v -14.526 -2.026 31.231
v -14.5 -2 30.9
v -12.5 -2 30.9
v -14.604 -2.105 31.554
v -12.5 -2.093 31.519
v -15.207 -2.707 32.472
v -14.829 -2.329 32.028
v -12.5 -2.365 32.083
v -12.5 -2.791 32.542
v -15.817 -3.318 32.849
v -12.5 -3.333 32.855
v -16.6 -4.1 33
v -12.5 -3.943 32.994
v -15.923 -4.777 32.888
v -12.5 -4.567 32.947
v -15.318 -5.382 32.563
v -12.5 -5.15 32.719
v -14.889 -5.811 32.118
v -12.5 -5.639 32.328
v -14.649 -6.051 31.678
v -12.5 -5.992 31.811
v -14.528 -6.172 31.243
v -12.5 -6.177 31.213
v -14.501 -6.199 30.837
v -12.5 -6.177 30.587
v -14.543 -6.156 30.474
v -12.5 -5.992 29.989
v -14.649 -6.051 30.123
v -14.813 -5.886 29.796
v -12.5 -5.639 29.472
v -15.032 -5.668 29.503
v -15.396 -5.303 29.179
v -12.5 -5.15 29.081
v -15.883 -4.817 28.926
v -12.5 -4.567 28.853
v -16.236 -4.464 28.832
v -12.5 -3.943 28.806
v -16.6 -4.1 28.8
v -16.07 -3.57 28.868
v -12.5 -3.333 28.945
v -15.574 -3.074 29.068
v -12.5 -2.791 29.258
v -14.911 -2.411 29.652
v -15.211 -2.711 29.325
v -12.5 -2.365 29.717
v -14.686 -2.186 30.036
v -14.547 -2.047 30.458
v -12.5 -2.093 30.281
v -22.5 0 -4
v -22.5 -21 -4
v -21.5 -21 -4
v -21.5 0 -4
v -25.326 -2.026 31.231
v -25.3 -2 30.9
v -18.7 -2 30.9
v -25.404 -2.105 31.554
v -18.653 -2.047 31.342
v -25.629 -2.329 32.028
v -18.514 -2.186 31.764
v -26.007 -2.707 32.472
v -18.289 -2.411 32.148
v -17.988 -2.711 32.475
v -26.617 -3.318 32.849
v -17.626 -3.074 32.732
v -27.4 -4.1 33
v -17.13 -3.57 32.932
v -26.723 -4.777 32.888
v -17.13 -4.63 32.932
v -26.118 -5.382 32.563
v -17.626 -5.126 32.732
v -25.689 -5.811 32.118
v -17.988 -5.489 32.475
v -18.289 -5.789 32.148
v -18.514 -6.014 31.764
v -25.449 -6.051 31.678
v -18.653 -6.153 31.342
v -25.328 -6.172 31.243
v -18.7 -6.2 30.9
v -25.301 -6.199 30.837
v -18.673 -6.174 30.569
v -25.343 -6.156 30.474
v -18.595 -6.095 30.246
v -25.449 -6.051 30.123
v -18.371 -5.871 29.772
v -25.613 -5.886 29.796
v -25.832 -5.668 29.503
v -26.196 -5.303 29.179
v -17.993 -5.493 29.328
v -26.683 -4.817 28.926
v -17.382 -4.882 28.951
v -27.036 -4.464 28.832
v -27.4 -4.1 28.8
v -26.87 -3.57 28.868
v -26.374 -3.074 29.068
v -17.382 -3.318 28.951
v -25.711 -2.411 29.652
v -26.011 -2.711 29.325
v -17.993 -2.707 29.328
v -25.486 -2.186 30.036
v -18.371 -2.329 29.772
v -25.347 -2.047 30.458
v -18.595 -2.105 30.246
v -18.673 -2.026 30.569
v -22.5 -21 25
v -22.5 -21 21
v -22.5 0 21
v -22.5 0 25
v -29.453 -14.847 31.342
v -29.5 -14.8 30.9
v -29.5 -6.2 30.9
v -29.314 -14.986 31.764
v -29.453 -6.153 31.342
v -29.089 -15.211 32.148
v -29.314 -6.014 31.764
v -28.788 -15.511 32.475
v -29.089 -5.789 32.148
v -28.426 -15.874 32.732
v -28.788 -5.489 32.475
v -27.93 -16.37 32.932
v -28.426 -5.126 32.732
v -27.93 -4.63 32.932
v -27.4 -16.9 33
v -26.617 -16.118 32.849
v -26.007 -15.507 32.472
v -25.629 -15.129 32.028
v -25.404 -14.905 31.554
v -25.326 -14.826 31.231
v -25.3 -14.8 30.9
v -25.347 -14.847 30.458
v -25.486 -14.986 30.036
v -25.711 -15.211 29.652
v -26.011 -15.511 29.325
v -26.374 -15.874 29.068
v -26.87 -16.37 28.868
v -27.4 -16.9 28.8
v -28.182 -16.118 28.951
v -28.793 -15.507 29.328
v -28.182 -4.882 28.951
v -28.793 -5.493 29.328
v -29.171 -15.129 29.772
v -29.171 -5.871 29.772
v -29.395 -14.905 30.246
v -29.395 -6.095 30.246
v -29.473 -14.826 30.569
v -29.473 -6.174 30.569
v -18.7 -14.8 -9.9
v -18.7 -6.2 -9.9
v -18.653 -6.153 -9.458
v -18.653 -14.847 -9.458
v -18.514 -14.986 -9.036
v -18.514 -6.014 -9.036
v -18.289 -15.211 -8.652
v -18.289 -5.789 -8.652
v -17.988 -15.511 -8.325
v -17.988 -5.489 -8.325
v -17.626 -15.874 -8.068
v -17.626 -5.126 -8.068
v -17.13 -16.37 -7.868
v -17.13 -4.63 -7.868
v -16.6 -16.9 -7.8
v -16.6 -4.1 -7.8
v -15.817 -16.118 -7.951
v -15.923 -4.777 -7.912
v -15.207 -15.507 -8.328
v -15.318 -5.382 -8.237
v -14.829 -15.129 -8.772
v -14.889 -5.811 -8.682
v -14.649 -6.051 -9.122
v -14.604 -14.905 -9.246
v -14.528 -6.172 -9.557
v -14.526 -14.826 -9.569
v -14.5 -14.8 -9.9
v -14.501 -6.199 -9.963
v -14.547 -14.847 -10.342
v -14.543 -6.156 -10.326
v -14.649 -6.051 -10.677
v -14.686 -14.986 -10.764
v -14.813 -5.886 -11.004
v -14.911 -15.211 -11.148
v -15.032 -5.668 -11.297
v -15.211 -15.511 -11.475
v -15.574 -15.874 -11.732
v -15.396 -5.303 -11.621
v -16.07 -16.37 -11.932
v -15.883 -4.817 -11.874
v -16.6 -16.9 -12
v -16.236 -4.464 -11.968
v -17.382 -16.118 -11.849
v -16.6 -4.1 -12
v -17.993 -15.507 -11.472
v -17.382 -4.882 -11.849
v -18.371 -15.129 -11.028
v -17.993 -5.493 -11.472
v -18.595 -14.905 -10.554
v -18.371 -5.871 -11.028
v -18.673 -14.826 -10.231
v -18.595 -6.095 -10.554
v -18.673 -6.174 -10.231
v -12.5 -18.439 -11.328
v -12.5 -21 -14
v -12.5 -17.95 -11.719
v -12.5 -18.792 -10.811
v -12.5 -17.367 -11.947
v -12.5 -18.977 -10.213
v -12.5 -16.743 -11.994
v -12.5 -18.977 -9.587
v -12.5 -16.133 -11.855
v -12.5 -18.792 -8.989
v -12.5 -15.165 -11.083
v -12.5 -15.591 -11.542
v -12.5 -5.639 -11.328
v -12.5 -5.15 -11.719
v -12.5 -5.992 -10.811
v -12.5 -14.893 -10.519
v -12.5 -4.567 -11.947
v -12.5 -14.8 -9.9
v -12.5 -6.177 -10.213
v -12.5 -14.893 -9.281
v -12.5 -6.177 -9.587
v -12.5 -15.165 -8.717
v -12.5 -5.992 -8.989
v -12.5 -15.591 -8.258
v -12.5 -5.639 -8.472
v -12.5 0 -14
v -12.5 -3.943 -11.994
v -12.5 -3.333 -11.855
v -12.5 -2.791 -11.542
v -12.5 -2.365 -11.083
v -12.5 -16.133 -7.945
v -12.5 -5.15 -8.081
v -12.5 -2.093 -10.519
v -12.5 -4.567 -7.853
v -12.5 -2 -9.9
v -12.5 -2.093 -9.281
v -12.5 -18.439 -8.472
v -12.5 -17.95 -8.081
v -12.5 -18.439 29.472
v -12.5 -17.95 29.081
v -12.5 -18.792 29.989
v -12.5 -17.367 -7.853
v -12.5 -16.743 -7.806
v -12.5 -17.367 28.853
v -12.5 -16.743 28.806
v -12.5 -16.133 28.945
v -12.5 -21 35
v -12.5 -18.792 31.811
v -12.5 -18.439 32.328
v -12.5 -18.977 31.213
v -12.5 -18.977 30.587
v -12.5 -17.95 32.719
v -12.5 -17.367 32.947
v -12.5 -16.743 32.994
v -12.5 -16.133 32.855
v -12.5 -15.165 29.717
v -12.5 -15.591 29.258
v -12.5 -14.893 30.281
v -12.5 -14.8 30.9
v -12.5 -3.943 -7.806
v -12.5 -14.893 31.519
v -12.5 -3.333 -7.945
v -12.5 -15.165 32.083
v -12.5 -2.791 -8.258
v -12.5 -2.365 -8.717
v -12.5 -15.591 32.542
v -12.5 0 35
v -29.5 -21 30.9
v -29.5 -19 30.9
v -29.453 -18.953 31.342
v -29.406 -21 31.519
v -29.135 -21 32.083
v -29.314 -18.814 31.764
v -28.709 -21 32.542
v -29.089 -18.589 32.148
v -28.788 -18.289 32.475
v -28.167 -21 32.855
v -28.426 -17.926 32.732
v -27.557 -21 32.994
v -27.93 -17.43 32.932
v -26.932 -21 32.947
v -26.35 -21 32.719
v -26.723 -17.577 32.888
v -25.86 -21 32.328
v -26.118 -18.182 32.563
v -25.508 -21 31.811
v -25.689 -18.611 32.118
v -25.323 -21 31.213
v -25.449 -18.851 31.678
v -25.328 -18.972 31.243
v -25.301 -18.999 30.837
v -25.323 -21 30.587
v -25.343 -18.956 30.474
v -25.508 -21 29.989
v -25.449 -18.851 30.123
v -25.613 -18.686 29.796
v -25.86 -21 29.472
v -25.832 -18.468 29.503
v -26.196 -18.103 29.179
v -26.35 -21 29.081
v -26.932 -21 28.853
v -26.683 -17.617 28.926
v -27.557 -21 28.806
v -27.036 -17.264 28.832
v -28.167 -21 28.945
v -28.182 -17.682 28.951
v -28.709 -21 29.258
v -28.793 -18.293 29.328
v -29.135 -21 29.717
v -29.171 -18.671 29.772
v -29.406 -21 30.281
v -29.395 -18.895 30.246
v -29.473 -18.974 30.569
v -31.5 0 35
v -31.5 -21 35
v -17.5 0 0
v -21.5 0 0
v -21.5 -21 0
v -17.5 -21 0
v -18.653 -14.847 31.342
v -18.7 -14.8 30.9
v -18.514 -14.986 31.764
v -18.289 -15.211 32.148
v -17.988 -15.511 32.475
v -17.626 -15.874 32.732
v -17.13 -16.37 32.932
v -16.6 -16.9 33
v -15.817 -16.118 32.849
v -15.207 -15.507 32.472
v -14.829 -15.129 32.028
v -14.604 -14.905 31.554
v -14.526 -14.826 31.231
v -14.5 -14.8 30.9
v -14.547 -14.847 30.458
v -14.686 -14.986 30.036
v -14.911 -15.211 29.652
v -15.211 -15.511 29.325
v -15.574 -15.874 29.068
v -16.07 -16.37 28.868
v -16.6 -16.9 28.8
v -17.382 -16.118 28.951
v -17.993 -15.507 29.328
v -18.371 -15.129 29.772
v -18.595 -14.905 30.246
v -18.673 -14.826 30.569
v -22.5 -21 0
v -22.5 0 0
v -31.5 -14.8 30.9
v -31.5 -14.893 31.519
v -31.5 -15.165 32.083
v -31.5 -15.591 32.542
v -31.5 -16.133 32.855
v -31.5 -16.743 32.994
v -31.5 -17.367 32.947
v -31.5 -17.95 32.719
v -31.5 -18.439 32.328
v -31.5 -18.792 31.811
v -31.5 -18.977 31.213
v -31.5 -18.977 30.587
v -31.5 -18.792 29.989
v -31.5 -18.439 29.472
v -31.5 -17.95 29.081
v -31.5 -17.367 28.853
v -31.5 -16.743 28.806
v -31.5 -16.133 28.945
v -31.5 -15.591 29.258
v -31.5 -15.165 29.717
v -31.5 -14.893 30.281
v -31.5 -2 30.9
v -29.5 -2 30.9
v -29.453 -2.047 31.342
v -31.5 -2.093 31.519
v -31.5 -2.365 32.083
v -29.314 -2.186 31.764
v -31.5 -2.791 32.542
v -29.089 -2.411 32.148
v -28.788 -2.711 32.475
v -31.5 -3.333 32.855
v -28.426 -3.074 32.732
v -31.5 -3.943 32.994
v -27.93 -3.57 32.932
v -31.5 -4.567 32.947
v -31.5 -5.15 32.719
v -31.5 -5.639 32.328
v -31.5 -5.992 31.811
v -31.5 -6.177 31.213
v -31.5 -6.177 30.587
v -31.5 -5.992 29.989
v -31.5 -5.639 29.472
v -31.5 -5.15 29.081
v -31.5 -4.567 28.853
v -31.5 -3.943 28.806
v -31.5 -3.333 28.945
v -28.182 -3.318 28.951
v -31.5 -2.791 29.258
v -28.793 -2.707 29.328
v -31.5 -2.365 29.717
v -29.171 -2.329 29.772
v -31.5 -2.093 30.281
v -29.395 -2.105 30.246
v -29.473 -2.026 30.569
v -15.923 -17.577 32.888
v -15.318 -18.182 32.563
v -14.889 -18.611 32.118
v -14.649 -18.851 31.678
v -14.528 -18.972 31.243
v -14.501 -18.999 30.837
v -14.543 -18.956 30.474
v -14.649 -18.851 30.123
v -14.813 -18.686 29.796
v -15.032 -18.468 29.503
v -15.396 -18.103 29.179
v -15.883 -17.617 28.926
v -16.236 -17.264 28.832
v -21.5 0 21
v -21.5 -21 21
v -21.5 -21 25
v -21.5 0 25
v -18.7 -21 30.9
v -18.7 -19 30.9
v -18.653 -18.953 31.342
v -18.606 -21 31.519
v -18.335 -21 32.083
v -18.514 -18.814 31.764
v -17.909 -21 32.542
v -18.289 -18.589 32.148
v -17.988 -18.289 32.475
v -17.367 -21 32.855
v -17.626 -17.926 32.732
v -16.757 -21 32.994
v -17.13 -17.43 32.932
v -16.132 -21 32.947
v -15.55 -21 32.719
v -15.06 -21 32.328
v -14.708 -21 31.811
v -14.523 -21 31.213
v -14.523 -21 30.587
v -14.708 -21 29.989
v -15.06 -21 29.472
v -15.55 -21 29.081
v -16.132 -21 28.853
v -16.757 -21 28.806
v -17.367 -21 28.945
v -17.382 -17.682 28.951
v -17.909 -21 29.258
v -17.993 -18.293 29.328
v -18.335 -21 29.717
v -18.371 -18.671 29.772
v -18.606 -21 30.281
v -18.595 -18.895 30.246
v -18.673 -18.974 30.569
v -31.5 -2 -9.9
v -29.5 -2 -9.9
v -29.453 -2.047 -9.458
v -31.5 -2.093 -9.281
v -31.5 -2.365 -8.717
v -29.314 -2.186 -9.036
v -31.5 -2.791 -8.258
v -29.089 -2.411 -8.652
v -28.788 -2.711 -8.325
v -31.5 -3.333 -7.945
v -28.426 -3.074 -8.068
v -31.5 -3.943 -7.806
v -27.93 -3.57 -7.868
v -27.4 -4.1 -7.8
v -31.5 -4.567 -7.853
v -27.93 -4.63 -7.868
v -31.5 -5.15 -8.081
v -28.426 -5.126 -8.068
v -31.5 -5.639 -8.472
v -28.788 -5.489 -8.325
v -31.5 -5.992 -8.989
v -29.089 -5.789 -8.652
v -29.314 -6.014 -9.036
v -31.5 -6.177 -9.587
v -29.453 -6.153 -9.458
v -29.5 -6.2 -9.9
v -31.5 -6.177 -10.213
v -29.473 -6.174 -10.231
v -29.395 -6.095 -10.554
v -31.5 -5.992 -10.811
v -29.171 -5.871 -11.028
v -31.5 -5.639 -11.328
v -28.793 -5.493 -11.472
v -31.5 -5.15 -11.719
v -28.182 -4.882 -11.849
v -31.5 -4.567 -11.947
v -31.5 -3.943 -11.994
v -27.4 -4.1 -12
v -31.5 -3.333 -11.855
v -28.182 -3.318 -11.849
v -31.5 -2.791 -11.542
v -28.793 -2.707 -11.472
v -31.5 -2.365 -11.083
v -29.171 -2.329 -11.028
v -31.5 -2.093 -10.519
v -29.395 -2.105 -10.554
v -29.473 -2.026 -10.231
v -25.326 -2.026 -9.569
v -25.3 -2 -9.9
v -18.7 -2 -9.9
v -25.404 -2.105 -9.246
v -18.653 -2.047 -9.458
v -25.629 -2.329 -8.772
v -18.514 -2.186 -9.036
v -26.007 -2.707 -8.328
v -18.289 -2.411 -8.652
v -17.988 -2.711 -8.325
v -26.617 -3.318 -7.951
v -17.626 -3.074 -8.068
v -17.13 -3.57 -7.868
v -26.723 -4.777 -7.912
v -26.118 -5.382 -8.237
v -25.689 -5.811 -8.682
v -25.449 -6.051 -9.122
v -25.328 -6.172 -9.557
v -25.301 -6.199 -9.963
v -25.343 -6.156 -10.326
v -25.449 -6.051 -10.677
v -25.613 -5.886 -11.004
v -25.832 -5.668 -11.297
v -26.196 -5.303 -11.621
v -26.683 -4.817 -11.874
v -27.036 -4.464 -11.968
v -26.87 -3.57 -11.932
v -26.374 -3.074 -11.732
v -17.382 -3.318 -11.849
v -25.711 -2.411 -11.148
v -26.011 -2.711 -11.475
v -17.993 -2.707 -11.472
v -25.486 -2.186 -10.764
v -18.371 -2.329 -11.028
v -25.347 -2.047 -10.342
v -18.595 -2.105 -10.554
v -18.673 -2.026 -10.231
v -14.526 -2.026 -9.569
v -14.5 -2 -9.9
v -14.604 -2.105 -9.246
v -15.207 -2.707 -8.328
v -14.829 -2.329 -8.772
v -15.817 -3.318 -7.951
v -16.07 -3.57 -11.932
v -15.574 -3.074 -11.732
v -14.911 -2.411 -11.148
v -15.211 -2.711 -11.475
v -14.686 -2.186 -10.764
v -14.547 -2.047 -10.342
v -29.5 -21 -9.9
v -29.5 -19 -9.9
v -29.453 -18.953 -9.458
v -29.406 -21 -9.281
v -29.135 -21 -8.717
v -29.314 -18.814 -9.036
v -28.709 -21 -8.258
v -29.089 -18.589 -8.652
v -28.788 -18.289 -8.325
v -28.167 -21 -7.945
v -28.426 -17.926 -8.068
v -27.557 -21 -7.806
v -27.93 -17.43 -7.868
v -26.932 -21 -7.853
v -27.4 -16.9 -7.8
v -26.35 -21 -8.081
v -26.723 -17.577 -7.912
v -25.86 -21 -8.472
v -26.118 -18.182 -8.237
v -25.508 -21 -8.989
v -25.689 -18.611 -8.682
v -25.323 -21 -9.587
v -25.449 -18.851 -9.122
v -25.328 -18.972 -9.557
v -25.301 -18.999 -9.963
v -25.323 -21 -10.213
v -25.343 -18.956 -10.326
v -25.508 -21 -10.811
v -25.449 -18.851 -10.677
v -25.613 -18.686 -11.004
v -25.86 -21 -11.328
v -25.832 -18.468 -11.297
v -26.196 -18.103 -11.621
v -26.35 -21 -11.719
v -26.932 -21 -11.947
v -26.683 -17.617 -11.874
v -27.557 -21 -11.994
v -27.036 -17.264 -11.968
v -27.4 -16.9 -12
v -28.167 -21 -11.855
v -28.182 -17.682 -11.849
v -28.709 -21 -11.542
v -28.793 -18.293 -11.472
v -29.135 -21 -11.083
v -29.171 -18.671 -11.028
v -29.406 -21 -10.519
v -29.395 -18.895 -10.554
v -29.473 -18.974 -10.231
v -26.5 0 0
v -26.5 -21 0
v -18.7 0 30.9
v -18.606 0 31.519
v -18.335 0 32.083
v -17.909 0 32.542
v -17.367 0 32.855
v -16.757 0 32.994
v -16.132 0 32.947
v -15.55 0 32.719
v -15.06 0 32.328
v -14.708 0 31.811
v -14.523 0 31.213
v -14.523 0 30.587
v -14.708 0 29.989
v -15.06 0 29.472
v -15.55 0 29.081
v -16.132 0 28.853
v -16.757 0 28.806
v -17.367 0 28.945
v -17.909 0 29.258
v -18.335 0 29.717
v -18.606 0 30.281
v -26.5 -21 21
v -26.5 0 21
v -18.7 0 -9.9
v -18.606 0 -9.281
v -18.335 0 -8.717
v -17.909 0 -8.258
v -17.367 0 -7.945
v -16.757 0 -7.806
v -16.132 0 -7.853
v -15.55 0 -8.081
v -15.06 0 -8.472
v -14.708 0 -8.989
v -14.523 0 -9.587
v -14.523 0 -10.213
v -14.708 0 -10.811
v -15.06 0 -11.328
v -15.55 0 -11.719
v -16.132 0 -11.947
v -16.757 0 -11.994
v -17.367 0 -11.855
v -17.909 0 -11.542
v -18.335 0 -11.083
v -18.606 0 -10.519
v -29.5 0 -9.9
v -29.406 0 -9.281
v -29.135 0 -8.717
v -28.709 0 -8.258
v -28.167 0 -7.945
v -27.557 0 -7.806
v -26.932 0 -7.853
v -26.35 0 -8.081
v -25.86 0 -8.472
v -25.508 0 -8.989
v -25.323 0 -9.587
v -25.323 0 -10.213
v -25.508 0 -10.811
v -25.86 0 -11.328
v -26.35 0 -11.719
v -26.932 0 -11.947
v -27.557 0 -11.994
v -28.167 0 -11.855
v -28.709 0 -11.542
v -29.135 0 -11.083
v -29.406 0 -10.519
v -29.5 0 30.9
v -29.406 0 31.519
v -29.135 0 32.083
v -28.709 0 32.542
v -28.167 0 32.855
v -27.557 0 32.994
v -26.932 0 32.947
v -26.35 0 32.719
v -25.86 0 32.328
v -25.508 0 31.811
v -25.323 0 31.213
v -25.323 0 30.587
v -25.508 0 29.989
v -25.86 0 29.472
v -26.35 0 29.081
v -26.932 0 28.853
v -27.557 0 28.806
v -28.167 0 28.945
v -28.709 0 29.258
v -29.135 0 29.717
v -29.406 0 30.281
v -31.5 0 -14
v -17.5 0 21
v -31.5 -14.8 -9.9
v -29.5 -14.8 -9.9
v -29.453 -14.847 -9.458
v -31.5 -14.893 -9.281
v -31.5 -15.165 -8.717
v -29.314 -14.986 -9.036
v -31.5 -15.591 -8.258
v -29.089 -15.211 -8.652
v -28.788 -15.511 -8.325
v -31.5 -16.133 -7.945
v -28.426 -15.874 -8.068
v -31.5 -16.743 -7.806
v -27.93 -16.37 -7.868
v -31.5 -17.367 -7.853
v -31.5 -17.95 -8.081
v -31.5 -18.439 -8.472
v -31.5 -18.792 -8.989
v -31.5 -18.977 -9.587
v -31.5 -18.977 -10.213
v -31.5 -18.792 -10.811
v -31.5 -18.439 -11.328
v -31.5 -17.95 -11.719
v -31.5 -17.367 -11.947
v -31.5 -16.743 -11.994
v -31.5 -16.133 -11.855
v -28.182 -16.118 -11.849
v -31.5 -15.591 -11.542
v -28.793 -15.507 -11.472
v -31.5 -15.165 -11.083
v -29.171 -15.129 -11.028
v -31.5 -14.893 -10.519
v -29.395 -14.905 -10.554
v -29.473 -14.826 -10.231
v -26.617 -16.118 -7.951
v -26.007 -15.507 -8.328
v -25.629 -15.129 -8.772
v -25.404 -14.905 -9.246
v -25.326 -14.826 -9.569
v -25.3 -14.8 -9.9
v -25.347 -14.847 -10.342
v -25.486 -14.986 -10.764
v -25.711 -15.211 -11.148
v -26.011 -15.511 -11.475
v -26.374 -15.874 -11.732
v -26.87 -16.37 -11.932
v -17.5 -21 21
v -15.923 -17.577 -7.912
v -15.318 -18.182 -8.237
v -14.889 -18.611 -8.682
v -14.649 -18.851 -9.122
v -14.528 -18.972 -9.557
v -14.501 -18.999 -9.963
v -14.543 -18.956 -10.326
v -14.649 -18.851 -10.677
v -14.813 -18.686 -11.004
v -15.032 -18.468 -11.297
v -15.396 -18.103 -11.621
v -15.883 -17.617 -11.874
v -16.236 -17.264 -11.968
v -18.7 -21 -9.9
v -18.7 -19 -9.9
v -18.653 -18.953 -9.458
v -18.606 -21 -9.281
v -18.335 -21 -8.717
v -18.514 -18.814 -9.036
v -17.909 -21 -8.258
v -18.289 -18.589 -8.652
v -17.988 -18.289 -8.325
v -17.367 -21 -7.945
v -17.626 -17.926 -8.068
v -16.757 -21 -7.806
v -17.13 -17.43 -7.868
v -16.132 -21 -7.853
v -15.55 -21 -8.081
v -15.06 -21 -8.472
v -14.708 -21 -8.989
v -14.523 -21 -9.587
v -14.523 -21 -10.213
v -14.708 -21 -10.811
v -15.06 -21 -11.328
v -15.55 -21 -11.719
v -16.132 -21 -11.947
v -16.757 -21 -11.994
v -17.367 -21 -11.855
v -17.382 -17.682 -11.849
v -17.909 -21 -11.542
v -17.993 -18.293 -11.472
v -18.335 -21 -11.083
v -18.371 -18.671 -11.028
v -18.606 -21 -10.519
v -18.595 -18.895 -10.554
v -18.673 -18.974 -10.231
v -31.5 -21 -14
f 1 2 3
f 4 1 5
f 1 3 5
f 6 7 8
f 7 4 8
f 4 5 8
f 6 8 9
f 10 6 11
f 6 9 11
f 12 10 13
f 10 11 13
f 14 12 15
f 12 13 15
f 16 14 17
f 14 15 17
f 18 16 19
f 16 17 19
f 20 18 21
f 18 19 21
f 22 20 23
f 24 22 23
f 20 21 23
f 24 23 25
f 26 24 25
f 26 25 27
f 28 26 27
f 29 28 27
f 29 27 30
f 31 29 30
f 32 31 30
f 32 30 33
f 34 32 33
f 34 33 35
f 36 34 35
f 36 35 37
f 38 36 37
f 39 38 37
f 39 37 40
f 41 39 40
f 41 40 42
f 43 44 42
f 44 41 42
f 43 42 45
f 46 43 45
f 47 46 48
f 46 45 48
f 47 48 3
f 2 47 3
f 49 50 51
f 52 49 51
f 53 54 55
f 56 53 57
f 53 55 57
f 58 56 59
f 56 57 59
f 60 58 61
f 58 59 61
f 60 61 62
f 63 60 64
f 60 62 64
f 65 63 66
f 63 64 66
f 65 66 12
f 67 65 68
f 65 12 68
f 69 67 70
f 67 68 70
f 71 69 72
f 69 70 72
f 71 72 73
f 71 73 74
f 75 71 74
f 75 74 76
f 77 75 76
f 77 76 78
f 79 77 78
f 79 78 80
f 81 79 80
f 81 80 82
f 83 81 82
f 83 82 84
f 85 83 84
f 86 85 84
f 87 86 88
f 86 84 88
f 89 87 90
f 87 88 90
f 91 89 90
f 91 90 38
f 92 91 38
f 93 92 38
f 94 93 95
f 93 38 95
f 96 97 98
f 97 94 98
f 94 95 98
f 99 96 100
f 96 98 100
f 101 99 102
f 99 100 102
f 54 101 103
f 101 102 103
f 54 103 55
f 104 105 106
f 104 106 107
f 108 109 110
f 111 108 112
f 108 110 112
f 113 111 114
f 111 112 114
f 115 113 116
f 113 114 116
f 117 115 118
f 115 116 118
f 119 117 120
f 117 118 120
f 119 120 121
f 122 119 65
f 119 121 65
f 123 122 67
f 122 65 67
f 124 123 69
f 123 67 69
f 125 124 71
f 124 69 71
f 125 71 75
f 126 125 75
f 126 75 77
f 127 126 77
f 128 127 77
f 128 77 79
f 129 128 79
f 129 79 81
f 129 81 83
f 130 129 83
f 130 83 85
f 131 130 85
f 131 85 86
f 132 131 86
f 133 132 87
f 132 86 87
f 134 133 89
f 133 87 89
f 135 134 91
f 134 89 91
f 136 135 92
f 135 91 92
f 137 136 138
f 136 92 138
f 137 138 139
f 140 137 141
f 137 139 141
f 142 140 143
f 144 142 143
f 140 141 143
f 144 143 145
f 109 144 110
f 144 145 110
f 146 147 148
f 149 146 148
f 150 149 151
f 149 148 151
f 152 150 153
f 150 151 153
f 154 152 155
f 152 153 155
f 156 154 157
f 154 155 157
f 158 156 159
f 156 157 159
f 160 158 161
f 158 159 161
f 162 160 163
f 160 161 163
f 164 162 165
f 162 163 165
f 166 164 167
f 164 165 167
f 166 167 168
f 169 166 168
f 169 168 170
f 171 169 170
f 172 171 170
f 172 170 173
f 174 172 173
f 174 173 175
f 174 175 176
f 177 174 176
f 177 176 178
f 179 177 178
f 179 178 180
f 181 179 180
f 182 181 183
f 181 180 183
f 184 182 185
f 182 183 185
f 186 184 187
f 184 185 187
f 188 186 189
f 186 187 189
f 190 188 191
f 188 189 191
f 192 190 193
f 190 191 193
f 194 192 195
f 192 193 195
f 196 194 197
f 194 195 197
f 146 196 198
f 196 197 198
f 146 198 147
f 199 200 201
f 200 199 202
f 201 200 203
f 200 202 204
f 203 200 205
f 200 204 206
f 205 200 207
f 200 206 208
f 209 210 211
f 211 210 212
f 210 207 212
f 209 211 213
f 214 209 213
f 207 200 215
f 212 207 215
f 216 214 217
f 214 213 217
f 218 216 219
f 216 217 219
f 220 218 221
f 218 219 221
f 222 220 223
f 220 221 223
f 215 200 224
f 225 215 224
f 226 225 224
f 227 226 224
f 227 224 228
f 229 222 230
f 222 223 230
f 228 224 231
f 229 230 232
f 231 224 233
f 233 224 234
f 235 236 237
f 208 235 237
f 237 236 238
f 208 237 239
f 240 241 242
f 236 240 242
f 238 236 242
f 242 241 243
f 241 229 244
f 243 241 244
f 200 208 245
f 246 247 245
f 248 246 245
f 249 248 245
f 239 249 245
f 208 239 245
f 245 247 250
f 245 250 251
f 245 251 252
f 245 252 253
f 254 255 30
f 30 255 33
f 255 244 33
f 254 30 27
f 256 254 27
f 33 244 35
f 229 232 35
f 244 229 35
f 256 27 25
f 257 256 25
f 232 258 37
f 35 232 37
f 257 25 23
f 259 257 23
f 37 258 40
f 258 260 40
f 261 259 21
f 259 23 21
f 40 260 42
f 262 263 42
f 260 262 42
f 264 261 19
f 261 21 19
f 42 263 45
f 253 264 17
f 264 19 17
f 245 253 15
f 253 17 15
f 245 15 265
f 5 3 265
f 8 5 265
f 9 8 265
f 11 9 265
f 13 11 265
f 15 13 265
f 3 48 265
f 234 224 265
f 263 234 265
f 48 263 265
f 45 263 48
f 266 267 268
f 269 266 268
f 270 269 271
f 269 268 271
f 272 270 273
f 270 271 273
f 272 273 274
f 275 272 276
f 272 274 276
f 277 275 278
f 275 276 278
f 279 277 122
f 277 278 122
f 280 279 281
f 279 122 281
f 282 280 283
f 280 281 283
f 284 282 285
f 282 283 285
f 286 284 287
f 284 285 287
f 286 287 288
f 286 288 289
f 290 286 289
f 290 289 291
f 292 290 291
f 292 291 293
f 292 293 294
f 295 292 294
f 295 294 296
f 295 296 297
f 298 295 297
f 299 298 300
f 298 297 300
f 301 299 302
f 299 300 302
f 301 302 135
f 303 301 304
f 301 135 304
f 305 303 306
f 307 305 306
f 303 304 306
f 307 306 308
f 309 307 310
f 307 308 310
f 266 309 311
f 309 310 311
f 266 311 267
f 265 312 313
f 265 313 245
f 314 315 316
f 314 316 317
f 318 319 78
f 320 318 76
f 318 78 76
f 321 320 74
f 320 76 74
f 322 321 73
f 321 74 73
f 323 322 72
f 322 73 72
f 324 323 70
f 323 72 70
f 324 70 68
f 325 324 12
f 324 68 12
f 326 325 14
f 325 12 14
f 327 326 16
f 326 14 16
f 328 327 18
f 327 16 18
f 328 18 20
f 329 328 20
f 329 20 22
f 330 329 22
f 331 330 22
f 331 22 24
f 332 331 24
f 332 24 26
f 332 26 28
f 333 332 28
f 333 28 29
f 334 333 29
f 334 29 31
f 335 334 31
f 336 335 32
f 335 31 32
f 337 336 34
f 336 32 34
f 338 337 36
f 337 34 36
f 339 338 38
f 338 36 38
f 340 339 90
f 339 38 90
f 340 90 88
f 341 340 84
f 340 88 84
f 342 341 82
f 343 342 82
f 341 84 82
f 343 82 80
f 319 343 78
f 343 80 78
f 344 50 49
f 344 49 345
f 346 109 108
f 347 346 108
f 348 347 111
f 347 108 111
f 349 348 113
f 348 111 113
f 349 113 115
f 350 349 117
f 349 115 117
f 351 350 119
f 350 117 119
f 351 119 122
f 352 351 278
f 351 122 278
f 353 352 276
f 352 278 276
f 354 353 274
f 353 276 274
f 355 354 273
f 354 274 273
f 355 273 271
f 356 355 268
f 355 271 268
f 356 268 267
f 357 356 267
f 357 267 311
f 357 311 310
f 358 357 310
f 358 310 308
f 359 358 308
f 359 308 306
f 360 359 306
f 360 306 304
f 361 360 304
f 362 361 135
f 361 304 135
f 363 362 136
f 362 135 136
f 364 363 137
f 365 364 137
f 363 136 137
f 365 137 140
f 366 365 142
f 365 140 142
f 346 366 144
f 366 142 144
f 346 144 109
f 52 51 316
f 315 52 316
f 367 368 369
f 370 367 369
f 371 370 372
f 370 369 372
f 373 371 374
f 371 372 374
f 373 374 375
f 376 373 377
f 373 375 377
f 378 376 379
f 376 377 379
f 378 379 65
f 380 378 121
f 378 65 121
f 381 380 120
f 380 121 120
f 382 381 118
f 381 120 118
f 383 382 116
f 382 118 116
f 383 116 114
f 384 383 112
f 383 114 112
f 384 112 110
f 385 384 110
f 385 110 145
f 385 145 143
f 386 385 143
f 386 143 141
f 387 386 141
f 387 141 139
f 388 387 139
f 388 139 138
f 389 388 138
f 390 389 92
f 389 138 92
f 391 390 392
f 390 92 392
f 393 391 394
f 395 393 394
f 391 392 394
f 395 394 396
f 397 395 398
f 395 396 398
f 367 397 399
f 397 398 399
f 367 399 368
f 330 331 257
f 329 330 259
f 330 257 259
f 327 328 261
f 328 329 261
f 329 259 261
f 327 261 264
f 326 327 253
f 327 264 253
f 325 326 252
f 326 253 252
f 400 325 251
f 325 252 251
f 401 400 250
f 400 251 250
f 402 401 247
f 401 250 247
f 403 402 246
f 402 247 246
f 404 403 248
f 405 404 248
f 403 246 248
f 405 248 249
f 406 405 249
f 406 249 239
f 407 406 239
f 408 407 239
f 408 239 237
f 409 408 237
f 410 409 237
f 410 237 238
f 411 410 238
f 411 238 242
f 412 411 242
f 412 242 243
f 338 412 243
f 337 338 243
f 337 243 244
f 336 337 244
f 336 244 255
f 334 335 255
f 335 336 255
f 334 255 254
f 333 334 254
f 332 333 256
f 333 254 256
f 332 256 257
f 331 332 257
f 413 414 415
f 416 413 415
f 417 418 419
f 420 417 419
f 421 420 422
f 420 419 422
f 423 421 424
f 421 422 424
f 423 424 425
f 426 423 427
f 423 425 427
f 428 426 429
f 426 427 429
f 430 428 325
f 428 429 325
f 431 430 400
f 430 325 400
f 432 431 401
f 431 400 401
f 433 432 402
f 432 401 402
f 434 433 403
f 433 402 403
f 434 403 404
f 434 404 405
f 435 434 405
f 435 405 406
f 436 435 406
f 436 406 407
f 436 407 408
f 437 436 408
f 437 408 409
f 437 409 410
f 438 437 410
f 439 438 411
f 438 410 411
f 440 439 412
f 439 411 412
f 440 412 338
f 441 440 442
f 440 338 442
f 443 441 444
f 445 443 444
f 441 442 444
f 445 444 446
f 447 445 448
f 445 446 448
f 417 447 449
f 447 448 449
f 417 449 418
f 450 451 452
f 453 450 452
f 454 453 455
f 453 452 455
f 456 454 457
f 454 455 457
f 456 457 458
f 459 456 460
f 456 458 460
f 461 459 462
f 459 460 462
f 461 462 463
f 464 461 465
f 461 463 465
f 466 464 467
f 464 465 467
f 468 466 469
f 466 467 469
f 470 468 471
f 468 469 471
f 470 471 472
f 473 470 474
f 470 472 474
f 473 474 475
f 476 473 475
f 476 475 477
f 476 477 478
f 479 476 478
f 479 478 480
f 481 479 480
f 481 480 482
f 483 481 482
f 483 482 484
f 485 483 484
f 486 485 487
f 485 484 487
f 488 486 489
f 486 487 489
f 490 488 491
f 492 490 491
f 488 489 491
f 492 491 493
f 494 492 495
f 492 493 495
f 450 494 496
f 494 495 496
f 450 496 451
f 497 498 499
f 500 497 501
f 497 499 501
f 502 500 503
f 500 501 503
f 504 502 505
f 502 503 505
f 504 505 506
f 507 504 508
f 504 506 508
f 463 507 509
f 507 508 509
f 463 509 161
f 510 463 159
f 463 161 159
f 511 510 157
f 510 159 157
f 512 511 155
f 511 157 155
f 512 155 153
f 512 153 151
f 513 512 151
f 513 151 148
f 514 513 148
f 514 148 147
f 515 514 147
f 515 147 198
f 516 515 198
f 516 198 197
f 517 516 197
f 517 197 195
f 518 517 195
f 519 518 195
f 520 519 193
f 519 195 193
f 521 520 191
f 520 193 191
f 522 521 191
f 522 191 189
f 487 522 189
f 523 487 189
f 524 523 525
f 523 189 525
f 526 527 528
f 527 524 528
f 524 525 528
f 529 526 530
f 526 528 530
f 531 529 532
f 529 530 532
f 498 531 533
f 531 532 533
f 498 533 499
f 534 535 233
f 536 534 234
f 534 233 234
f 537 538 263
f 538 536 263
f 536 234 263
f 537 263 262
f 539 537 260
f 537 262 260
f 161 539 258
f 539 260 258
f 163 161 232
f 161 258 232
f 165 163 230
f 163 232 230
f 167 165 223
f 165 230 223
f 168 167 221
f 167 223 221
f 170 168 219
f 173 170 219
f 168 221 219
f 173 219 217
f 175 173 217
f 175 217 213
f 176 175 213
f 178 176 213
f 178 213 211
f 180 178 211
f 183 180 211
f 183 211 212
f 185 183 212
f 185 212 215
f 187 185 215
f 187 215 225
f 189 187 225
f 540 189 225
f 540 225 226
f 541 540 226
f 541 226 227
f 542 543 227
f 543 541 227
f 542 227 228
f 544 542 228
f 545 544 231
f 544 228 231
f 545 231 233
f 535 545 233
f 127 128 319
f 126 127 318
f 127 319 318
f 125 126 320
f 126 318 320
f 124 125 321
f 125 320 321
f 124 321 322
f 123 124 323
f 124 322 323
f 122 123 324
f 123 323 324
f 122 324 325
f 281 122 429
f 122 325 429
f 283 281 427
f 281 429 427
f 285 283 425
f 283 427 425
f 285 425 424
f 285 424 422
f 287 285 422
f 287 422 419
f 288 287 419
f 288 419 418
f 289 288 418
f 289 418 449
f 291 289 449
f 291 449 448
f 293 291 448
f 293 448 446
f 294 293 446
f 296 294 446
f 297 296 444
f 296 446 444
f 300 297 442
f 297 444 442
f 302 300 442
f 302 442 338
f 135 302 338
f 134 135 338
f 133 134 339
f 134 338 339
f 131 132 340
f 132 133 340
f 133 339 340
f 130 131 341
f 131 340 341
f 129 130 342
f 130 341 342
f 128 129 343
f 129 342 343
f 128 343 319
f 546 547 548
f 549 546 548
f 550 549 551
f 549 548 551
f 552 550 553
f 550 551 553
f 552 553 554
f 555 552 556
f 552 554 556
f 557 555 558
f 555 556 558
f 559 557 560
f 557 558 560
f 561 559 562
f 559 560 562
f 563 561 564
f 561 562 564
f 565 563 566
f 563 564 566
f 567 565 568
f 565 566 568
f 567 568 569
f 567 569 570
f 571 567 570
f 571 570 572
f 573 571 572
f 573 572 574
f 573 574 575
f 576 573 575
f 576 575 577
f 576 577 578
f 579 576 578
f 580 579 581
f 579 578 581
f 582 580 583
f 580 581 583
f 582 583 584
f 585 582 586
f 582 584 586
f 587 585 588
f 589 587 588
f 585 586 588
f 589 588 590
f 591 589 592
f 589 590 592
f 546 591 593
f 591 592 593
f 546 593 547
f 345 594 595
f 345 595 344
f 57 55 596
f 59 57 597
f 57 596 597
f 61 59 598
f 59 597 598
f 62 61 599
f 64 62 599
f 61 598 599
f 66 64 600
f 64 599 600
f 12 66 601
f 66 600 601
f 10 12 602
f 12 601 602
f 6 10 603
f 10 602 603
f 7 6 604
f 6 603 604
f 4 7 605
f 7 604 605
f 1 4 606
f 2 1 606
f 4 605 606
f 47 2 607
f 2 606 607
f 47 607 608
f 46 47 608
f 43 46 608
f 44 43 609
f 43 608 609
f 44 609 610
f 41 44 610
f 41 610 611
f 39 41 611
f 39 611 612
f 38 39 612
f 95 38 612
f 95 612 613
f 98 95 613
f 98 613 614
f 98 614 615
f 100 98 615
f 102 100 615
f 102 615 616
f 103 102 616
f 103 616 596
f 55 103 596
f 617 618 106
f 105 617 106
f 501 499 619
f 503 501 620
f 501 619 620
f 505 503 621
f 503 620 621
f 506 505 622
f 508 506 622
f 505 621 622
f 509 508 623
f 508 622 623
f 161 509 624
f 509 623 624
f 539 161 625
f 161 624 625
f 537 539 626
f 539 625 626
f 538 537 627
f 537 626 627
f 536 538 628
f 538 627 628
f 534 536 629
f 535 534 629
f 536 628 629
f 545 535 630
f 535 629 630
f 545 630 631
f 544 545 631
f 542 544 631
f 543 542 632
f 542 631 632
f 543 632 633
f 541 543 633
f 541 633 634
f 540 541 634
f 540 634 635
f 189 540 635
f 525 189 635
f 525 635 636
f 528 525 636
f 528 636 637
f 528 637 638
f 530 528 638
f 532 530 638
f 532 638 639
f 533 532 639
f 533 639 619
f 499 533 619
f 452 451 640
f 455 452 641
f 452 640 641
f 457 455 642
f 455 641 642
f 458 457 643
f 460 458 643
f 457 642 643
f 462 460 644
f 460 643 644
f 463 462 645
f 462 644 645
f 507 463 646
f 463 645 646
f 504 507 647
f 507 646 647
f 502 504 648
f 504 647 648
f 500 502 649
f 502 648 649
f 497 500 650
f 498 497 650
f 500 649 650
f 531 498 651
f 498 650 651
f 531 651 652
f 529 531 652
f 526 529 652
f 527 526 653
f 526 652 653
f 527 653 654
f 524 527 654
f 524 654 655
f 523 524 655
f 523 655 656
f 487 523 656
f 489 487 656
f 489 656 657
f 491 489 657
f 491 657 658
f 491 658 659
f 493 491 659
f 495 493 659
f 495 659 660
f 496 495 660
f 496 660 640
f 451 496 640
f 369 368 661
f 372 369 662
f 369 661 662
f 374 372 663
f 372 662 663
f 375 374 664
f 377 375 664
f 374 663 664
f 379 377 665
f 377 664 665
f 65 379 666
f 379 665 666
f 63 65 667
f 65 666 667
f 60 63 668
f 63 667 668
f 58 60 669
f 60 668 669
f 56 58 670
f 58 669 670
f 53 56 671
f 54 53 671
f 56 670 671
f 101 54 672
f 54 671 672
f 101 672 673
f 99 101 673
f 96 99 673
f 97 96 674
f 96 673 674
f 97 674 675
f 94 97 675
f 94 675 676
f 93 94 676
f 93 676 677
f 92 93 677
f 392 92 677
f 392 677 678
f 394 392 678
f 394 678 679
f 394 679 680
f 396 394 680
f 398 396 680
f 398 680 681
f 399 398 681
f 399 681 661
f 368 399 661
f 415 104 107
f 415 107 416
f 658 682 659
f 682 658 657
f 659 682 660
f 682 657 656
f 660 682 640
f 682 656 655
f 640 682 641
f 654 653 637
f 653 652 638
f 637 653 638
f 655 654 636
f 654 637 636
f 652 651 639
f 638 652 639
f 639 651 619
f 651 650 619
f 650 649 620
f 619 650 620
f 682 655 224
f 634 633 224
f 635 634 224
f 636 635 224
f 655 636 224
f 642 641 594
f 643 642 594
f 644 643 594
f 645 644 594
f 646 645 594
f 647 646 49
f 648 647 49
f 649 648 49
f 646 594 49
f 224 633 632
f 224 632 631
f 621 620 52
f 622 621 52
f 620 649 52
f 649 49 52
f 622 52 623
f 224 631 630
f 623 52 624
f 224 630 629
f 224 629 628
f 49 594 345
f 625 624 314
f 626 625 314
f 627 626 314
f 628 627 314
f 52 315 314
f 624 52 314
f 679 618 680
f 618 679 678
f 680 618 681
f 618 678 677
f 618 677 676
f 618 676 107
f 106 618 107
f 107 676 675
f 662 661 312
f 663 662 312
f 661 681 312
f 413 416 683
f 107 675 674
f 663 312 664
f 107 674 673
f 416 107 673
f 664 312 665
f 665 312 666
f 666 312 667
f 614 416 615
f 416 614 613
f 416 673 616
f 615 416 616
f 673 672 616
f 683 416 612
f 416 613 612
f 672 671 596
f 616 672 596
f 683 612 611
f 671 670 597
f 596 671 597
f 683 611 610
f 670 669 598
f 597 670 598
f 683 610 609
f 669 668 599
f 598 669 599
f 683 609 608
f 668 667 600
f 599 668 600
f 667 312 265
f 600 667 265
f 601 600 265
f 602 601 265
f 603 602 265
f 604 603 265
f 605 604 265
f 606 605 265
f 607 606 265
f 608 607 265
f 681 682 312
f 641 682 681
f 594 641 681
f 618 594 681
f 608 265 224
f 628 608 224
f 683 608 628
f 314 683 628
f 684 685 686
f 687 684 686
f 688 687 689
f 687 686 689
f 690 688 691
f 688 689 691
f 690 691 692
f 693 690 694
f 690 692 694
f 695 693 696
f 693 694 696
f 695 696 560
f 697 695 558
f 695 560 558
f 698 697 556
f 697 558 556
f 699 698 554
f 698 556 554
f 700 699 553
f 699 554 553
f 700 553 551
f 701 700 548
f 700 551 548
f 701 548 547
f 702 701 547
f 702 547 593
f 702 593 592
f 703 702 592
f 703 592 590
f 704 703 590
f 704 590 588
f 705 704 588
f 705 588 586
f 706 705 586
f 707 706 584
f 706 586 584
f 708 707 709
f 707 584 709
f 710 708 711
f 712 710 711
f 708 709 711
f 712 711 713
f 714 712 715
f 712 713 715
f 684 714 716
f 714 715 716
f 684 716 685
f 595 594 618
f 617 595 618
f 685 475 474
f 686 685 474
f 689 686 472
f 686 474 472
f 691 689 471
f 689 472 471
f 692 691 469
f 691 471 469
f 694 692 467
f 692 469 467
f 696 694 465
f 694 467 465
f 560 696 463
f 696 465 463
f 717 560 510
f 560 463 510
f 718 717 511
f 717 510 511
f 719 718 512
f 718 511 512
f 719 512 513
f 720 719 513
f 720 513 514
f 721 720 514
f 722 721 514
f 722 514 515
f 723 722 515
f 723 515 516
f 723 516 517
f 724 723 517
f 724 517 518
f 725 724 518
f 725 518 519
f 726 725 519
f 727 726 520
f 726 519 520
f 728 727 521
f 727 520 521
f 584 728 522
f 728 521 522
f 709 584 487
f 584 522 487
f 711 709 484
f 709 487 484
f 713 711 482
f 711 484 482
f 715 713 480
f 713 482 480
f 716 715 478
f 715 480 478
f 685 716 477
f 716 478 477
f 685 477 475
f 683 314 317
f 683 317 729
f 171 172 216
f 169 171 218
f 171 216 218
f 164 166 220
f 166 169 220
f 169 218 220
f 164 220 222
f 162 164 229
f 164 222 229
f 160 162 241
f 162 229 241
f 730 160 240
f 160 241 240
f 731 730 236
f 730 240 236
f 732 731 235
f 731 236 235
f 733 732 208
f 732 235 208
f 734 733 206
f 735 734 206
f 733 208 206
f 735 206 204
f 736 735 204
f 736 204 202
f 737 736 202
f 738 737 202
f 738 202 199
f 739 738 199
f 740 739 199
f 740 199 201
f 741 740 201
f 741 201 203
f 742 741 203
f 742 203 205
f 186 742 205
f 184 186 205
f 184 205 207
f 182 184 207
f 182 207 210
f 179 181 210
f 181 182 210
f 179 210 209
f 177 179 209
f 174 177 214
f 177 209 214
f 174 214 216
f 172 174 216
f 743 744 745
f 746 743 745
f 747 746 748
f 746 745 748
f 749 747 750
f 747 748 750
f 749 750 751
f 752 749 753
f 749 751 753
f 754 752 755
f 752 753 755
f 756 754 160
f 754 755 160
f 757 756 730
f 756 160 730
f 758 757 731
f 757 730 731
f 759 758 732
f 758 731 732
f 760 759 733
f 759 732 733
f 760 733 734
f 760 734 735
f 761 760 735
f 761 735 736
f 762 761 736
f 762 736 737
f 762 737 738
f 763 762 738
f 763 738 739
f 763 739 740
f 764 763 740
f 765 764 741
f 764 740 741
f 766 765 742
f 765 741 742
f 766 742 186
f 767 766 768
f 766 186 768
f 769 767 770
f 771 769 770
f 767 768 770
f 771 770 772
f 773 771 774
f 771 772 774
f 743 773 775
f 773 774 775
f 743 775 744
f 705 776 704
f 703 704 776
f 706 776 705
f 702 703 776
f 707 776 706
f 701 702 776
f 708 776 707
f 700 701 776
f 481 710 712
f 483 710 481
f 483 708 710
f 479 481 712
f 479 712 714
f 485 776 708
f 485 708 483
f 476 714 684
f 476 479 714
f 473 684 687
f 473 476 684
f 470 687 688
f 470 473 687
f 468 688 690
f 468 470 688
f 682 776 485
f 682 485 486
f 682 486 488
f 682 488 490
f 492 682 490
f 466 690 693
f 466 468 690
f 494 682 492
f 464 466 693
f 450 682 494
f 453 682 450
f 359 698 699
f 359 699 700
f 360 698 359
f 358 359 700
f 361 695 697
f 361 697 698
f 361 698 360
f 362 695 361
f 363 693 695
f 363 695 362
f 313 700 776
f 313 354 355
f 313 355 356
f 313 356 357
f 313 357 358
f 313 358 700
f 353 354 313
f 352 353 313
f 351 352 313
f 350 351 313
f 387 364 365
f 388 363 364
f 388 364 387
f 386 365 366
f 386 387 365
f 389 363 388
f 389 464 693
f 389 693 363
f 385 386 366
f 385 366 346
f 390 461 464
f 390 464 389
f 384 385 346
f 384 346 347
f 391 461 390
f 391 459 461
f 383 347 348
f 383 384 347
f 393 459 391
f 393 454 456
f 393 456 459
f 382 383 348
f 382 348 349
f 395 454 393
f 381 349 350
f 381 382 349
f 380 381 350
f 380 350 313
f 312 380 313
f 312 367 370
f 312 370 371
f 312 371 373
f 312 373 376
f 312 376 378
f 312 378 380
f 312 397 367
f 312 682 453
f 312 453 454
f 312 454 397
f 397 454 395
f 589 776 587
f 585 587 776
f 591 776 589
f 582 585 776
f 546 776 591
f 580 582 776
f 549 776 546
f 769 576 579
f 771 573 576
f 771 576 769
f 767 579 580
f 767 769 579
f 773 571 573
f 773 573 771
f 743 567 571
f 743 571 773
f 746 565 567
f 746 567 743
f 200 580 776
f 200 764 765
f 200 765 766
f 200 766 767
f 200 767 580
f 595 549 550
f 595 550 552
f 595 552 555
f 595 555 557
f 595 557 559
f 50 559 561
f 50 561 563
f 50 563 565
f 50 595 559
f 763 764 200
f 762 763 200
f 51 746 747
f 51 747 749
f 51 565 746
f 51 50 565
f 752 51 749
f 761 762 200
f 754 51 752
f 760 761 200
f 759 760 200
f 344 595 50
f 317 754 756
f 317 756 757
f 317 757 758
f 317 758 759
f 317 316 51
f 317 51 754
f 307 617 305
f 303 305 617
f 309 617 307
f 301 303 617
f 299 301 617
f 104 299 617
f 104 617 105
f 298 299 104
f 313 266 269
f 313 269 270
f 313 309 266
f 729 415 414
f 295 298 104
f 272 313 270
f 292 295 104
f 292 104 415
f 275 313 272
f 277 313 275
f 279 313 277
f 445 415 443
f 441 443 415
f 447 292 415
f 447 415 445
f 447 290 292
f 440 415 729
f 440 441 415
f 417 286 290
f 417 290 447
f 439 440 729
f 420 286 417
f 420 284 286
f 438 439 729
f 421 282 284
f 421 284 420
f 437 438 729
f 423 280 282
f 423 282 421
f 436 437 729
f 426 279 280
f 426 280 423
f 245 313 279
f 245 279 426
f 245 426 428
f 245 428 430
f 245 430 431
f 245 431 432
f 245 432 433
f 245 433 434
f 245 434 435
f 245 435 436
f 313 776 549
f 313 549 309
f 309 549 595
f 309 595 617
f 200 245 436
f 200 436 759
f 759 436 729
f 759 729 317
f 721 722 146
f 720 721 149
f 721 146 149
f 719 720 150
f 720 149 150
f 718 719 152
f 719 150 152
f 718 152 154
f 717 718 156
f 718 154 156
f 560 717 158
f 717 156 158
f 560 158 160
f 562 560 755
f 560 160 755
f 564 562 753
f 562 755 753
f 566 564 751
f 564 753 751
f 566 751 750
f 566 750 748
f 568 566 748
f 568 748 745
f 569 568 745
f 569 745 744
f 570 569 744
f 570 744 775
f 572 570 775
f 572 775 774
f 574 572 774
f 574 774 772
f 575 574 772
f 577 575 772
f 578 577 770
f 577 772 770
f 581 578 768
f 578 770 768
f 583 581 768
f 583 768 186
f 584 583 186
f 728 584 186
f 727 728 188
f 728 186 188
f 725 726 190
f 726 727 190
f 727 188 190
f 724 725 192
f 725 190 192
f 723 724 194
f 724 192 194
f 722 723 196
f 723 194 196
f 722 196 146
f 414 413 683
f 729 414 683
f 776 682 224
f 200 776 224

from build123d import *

# Parameters (mm, degrees)
F0_W     = 19
F0_H     = 49
F0_W_2   = 9
F0_H_2   = 21
F1_DEPTH = 21
F2_W     = 1
F2_H     = 4
F3_DEPTH = 25
F4_R     = 2.1
F5_DEPTH = 25
F6_R     = 2.1
F7_DEPTH = 25


with BuildPart() as f1:
    # F0 (on Front) → F1 (new body)
    with BuildSketch(Plane.XZ):
        with Locations((-21.999743, 10.5)):
            Rectangle(F0_W, F0_H)
        with Locations((-21.999743, 10.5)):
            Rectangle(F0_W_2, F0_H_2, mode=Mode.SUBTRACT)
    extrude(amount=F1_DEPTH)

    # F2 (on face) → F3 (cut)
    with BuildSketch(Plane.XZ.offset(21)):
        with Locations((-21.999743, 23)):
            Rectangle(F2_W, F2_H)
        with Locations((-21.999743, -2)):
            Rectangle(F2_W, F2_H)
    extrude(amount=-F3_DEPTH, mode=Mode.SUBTRACT)

    # F4 (on face) → F5 (cut)
    with BuildSketch(Plane(origin=(0, 0, 0), x_dir=(-1, 0, 0), z_dir=(0, 1, 0))):
        with Locations((16.599743, 30.9)):
            Circle(F4_R)
        with Locations((16.599743, -9.9)):
            Circle(F4_R)
        with Locations((27.399743, -9.9)):
            Circle(F4_R)
        with Locations((27.399743, 30.9)):
            Circle(F4_R)
    extrude(amount=-F5_DEPTH, mode=Mode.SUBTRACT)

    # F6 (on face) → F7 (cut)
    with BuildSketch(Plane.YZ.offset(-12.499743)):
        with Locations((-16.9, 30.9)):
            Circle(F6_R)
        with Locations((-16.9, -9.9)):
            Circle(F6_R)
        with Locations((-4.1, 30.9)):
            Circle(F6_R)
        with Locations((-4.1, -9.9)):
            Circle(F6_R)
    extrude(amount=-F7_DEPTH, mode=Mode.SUBTRACT)


solid = f1.part
